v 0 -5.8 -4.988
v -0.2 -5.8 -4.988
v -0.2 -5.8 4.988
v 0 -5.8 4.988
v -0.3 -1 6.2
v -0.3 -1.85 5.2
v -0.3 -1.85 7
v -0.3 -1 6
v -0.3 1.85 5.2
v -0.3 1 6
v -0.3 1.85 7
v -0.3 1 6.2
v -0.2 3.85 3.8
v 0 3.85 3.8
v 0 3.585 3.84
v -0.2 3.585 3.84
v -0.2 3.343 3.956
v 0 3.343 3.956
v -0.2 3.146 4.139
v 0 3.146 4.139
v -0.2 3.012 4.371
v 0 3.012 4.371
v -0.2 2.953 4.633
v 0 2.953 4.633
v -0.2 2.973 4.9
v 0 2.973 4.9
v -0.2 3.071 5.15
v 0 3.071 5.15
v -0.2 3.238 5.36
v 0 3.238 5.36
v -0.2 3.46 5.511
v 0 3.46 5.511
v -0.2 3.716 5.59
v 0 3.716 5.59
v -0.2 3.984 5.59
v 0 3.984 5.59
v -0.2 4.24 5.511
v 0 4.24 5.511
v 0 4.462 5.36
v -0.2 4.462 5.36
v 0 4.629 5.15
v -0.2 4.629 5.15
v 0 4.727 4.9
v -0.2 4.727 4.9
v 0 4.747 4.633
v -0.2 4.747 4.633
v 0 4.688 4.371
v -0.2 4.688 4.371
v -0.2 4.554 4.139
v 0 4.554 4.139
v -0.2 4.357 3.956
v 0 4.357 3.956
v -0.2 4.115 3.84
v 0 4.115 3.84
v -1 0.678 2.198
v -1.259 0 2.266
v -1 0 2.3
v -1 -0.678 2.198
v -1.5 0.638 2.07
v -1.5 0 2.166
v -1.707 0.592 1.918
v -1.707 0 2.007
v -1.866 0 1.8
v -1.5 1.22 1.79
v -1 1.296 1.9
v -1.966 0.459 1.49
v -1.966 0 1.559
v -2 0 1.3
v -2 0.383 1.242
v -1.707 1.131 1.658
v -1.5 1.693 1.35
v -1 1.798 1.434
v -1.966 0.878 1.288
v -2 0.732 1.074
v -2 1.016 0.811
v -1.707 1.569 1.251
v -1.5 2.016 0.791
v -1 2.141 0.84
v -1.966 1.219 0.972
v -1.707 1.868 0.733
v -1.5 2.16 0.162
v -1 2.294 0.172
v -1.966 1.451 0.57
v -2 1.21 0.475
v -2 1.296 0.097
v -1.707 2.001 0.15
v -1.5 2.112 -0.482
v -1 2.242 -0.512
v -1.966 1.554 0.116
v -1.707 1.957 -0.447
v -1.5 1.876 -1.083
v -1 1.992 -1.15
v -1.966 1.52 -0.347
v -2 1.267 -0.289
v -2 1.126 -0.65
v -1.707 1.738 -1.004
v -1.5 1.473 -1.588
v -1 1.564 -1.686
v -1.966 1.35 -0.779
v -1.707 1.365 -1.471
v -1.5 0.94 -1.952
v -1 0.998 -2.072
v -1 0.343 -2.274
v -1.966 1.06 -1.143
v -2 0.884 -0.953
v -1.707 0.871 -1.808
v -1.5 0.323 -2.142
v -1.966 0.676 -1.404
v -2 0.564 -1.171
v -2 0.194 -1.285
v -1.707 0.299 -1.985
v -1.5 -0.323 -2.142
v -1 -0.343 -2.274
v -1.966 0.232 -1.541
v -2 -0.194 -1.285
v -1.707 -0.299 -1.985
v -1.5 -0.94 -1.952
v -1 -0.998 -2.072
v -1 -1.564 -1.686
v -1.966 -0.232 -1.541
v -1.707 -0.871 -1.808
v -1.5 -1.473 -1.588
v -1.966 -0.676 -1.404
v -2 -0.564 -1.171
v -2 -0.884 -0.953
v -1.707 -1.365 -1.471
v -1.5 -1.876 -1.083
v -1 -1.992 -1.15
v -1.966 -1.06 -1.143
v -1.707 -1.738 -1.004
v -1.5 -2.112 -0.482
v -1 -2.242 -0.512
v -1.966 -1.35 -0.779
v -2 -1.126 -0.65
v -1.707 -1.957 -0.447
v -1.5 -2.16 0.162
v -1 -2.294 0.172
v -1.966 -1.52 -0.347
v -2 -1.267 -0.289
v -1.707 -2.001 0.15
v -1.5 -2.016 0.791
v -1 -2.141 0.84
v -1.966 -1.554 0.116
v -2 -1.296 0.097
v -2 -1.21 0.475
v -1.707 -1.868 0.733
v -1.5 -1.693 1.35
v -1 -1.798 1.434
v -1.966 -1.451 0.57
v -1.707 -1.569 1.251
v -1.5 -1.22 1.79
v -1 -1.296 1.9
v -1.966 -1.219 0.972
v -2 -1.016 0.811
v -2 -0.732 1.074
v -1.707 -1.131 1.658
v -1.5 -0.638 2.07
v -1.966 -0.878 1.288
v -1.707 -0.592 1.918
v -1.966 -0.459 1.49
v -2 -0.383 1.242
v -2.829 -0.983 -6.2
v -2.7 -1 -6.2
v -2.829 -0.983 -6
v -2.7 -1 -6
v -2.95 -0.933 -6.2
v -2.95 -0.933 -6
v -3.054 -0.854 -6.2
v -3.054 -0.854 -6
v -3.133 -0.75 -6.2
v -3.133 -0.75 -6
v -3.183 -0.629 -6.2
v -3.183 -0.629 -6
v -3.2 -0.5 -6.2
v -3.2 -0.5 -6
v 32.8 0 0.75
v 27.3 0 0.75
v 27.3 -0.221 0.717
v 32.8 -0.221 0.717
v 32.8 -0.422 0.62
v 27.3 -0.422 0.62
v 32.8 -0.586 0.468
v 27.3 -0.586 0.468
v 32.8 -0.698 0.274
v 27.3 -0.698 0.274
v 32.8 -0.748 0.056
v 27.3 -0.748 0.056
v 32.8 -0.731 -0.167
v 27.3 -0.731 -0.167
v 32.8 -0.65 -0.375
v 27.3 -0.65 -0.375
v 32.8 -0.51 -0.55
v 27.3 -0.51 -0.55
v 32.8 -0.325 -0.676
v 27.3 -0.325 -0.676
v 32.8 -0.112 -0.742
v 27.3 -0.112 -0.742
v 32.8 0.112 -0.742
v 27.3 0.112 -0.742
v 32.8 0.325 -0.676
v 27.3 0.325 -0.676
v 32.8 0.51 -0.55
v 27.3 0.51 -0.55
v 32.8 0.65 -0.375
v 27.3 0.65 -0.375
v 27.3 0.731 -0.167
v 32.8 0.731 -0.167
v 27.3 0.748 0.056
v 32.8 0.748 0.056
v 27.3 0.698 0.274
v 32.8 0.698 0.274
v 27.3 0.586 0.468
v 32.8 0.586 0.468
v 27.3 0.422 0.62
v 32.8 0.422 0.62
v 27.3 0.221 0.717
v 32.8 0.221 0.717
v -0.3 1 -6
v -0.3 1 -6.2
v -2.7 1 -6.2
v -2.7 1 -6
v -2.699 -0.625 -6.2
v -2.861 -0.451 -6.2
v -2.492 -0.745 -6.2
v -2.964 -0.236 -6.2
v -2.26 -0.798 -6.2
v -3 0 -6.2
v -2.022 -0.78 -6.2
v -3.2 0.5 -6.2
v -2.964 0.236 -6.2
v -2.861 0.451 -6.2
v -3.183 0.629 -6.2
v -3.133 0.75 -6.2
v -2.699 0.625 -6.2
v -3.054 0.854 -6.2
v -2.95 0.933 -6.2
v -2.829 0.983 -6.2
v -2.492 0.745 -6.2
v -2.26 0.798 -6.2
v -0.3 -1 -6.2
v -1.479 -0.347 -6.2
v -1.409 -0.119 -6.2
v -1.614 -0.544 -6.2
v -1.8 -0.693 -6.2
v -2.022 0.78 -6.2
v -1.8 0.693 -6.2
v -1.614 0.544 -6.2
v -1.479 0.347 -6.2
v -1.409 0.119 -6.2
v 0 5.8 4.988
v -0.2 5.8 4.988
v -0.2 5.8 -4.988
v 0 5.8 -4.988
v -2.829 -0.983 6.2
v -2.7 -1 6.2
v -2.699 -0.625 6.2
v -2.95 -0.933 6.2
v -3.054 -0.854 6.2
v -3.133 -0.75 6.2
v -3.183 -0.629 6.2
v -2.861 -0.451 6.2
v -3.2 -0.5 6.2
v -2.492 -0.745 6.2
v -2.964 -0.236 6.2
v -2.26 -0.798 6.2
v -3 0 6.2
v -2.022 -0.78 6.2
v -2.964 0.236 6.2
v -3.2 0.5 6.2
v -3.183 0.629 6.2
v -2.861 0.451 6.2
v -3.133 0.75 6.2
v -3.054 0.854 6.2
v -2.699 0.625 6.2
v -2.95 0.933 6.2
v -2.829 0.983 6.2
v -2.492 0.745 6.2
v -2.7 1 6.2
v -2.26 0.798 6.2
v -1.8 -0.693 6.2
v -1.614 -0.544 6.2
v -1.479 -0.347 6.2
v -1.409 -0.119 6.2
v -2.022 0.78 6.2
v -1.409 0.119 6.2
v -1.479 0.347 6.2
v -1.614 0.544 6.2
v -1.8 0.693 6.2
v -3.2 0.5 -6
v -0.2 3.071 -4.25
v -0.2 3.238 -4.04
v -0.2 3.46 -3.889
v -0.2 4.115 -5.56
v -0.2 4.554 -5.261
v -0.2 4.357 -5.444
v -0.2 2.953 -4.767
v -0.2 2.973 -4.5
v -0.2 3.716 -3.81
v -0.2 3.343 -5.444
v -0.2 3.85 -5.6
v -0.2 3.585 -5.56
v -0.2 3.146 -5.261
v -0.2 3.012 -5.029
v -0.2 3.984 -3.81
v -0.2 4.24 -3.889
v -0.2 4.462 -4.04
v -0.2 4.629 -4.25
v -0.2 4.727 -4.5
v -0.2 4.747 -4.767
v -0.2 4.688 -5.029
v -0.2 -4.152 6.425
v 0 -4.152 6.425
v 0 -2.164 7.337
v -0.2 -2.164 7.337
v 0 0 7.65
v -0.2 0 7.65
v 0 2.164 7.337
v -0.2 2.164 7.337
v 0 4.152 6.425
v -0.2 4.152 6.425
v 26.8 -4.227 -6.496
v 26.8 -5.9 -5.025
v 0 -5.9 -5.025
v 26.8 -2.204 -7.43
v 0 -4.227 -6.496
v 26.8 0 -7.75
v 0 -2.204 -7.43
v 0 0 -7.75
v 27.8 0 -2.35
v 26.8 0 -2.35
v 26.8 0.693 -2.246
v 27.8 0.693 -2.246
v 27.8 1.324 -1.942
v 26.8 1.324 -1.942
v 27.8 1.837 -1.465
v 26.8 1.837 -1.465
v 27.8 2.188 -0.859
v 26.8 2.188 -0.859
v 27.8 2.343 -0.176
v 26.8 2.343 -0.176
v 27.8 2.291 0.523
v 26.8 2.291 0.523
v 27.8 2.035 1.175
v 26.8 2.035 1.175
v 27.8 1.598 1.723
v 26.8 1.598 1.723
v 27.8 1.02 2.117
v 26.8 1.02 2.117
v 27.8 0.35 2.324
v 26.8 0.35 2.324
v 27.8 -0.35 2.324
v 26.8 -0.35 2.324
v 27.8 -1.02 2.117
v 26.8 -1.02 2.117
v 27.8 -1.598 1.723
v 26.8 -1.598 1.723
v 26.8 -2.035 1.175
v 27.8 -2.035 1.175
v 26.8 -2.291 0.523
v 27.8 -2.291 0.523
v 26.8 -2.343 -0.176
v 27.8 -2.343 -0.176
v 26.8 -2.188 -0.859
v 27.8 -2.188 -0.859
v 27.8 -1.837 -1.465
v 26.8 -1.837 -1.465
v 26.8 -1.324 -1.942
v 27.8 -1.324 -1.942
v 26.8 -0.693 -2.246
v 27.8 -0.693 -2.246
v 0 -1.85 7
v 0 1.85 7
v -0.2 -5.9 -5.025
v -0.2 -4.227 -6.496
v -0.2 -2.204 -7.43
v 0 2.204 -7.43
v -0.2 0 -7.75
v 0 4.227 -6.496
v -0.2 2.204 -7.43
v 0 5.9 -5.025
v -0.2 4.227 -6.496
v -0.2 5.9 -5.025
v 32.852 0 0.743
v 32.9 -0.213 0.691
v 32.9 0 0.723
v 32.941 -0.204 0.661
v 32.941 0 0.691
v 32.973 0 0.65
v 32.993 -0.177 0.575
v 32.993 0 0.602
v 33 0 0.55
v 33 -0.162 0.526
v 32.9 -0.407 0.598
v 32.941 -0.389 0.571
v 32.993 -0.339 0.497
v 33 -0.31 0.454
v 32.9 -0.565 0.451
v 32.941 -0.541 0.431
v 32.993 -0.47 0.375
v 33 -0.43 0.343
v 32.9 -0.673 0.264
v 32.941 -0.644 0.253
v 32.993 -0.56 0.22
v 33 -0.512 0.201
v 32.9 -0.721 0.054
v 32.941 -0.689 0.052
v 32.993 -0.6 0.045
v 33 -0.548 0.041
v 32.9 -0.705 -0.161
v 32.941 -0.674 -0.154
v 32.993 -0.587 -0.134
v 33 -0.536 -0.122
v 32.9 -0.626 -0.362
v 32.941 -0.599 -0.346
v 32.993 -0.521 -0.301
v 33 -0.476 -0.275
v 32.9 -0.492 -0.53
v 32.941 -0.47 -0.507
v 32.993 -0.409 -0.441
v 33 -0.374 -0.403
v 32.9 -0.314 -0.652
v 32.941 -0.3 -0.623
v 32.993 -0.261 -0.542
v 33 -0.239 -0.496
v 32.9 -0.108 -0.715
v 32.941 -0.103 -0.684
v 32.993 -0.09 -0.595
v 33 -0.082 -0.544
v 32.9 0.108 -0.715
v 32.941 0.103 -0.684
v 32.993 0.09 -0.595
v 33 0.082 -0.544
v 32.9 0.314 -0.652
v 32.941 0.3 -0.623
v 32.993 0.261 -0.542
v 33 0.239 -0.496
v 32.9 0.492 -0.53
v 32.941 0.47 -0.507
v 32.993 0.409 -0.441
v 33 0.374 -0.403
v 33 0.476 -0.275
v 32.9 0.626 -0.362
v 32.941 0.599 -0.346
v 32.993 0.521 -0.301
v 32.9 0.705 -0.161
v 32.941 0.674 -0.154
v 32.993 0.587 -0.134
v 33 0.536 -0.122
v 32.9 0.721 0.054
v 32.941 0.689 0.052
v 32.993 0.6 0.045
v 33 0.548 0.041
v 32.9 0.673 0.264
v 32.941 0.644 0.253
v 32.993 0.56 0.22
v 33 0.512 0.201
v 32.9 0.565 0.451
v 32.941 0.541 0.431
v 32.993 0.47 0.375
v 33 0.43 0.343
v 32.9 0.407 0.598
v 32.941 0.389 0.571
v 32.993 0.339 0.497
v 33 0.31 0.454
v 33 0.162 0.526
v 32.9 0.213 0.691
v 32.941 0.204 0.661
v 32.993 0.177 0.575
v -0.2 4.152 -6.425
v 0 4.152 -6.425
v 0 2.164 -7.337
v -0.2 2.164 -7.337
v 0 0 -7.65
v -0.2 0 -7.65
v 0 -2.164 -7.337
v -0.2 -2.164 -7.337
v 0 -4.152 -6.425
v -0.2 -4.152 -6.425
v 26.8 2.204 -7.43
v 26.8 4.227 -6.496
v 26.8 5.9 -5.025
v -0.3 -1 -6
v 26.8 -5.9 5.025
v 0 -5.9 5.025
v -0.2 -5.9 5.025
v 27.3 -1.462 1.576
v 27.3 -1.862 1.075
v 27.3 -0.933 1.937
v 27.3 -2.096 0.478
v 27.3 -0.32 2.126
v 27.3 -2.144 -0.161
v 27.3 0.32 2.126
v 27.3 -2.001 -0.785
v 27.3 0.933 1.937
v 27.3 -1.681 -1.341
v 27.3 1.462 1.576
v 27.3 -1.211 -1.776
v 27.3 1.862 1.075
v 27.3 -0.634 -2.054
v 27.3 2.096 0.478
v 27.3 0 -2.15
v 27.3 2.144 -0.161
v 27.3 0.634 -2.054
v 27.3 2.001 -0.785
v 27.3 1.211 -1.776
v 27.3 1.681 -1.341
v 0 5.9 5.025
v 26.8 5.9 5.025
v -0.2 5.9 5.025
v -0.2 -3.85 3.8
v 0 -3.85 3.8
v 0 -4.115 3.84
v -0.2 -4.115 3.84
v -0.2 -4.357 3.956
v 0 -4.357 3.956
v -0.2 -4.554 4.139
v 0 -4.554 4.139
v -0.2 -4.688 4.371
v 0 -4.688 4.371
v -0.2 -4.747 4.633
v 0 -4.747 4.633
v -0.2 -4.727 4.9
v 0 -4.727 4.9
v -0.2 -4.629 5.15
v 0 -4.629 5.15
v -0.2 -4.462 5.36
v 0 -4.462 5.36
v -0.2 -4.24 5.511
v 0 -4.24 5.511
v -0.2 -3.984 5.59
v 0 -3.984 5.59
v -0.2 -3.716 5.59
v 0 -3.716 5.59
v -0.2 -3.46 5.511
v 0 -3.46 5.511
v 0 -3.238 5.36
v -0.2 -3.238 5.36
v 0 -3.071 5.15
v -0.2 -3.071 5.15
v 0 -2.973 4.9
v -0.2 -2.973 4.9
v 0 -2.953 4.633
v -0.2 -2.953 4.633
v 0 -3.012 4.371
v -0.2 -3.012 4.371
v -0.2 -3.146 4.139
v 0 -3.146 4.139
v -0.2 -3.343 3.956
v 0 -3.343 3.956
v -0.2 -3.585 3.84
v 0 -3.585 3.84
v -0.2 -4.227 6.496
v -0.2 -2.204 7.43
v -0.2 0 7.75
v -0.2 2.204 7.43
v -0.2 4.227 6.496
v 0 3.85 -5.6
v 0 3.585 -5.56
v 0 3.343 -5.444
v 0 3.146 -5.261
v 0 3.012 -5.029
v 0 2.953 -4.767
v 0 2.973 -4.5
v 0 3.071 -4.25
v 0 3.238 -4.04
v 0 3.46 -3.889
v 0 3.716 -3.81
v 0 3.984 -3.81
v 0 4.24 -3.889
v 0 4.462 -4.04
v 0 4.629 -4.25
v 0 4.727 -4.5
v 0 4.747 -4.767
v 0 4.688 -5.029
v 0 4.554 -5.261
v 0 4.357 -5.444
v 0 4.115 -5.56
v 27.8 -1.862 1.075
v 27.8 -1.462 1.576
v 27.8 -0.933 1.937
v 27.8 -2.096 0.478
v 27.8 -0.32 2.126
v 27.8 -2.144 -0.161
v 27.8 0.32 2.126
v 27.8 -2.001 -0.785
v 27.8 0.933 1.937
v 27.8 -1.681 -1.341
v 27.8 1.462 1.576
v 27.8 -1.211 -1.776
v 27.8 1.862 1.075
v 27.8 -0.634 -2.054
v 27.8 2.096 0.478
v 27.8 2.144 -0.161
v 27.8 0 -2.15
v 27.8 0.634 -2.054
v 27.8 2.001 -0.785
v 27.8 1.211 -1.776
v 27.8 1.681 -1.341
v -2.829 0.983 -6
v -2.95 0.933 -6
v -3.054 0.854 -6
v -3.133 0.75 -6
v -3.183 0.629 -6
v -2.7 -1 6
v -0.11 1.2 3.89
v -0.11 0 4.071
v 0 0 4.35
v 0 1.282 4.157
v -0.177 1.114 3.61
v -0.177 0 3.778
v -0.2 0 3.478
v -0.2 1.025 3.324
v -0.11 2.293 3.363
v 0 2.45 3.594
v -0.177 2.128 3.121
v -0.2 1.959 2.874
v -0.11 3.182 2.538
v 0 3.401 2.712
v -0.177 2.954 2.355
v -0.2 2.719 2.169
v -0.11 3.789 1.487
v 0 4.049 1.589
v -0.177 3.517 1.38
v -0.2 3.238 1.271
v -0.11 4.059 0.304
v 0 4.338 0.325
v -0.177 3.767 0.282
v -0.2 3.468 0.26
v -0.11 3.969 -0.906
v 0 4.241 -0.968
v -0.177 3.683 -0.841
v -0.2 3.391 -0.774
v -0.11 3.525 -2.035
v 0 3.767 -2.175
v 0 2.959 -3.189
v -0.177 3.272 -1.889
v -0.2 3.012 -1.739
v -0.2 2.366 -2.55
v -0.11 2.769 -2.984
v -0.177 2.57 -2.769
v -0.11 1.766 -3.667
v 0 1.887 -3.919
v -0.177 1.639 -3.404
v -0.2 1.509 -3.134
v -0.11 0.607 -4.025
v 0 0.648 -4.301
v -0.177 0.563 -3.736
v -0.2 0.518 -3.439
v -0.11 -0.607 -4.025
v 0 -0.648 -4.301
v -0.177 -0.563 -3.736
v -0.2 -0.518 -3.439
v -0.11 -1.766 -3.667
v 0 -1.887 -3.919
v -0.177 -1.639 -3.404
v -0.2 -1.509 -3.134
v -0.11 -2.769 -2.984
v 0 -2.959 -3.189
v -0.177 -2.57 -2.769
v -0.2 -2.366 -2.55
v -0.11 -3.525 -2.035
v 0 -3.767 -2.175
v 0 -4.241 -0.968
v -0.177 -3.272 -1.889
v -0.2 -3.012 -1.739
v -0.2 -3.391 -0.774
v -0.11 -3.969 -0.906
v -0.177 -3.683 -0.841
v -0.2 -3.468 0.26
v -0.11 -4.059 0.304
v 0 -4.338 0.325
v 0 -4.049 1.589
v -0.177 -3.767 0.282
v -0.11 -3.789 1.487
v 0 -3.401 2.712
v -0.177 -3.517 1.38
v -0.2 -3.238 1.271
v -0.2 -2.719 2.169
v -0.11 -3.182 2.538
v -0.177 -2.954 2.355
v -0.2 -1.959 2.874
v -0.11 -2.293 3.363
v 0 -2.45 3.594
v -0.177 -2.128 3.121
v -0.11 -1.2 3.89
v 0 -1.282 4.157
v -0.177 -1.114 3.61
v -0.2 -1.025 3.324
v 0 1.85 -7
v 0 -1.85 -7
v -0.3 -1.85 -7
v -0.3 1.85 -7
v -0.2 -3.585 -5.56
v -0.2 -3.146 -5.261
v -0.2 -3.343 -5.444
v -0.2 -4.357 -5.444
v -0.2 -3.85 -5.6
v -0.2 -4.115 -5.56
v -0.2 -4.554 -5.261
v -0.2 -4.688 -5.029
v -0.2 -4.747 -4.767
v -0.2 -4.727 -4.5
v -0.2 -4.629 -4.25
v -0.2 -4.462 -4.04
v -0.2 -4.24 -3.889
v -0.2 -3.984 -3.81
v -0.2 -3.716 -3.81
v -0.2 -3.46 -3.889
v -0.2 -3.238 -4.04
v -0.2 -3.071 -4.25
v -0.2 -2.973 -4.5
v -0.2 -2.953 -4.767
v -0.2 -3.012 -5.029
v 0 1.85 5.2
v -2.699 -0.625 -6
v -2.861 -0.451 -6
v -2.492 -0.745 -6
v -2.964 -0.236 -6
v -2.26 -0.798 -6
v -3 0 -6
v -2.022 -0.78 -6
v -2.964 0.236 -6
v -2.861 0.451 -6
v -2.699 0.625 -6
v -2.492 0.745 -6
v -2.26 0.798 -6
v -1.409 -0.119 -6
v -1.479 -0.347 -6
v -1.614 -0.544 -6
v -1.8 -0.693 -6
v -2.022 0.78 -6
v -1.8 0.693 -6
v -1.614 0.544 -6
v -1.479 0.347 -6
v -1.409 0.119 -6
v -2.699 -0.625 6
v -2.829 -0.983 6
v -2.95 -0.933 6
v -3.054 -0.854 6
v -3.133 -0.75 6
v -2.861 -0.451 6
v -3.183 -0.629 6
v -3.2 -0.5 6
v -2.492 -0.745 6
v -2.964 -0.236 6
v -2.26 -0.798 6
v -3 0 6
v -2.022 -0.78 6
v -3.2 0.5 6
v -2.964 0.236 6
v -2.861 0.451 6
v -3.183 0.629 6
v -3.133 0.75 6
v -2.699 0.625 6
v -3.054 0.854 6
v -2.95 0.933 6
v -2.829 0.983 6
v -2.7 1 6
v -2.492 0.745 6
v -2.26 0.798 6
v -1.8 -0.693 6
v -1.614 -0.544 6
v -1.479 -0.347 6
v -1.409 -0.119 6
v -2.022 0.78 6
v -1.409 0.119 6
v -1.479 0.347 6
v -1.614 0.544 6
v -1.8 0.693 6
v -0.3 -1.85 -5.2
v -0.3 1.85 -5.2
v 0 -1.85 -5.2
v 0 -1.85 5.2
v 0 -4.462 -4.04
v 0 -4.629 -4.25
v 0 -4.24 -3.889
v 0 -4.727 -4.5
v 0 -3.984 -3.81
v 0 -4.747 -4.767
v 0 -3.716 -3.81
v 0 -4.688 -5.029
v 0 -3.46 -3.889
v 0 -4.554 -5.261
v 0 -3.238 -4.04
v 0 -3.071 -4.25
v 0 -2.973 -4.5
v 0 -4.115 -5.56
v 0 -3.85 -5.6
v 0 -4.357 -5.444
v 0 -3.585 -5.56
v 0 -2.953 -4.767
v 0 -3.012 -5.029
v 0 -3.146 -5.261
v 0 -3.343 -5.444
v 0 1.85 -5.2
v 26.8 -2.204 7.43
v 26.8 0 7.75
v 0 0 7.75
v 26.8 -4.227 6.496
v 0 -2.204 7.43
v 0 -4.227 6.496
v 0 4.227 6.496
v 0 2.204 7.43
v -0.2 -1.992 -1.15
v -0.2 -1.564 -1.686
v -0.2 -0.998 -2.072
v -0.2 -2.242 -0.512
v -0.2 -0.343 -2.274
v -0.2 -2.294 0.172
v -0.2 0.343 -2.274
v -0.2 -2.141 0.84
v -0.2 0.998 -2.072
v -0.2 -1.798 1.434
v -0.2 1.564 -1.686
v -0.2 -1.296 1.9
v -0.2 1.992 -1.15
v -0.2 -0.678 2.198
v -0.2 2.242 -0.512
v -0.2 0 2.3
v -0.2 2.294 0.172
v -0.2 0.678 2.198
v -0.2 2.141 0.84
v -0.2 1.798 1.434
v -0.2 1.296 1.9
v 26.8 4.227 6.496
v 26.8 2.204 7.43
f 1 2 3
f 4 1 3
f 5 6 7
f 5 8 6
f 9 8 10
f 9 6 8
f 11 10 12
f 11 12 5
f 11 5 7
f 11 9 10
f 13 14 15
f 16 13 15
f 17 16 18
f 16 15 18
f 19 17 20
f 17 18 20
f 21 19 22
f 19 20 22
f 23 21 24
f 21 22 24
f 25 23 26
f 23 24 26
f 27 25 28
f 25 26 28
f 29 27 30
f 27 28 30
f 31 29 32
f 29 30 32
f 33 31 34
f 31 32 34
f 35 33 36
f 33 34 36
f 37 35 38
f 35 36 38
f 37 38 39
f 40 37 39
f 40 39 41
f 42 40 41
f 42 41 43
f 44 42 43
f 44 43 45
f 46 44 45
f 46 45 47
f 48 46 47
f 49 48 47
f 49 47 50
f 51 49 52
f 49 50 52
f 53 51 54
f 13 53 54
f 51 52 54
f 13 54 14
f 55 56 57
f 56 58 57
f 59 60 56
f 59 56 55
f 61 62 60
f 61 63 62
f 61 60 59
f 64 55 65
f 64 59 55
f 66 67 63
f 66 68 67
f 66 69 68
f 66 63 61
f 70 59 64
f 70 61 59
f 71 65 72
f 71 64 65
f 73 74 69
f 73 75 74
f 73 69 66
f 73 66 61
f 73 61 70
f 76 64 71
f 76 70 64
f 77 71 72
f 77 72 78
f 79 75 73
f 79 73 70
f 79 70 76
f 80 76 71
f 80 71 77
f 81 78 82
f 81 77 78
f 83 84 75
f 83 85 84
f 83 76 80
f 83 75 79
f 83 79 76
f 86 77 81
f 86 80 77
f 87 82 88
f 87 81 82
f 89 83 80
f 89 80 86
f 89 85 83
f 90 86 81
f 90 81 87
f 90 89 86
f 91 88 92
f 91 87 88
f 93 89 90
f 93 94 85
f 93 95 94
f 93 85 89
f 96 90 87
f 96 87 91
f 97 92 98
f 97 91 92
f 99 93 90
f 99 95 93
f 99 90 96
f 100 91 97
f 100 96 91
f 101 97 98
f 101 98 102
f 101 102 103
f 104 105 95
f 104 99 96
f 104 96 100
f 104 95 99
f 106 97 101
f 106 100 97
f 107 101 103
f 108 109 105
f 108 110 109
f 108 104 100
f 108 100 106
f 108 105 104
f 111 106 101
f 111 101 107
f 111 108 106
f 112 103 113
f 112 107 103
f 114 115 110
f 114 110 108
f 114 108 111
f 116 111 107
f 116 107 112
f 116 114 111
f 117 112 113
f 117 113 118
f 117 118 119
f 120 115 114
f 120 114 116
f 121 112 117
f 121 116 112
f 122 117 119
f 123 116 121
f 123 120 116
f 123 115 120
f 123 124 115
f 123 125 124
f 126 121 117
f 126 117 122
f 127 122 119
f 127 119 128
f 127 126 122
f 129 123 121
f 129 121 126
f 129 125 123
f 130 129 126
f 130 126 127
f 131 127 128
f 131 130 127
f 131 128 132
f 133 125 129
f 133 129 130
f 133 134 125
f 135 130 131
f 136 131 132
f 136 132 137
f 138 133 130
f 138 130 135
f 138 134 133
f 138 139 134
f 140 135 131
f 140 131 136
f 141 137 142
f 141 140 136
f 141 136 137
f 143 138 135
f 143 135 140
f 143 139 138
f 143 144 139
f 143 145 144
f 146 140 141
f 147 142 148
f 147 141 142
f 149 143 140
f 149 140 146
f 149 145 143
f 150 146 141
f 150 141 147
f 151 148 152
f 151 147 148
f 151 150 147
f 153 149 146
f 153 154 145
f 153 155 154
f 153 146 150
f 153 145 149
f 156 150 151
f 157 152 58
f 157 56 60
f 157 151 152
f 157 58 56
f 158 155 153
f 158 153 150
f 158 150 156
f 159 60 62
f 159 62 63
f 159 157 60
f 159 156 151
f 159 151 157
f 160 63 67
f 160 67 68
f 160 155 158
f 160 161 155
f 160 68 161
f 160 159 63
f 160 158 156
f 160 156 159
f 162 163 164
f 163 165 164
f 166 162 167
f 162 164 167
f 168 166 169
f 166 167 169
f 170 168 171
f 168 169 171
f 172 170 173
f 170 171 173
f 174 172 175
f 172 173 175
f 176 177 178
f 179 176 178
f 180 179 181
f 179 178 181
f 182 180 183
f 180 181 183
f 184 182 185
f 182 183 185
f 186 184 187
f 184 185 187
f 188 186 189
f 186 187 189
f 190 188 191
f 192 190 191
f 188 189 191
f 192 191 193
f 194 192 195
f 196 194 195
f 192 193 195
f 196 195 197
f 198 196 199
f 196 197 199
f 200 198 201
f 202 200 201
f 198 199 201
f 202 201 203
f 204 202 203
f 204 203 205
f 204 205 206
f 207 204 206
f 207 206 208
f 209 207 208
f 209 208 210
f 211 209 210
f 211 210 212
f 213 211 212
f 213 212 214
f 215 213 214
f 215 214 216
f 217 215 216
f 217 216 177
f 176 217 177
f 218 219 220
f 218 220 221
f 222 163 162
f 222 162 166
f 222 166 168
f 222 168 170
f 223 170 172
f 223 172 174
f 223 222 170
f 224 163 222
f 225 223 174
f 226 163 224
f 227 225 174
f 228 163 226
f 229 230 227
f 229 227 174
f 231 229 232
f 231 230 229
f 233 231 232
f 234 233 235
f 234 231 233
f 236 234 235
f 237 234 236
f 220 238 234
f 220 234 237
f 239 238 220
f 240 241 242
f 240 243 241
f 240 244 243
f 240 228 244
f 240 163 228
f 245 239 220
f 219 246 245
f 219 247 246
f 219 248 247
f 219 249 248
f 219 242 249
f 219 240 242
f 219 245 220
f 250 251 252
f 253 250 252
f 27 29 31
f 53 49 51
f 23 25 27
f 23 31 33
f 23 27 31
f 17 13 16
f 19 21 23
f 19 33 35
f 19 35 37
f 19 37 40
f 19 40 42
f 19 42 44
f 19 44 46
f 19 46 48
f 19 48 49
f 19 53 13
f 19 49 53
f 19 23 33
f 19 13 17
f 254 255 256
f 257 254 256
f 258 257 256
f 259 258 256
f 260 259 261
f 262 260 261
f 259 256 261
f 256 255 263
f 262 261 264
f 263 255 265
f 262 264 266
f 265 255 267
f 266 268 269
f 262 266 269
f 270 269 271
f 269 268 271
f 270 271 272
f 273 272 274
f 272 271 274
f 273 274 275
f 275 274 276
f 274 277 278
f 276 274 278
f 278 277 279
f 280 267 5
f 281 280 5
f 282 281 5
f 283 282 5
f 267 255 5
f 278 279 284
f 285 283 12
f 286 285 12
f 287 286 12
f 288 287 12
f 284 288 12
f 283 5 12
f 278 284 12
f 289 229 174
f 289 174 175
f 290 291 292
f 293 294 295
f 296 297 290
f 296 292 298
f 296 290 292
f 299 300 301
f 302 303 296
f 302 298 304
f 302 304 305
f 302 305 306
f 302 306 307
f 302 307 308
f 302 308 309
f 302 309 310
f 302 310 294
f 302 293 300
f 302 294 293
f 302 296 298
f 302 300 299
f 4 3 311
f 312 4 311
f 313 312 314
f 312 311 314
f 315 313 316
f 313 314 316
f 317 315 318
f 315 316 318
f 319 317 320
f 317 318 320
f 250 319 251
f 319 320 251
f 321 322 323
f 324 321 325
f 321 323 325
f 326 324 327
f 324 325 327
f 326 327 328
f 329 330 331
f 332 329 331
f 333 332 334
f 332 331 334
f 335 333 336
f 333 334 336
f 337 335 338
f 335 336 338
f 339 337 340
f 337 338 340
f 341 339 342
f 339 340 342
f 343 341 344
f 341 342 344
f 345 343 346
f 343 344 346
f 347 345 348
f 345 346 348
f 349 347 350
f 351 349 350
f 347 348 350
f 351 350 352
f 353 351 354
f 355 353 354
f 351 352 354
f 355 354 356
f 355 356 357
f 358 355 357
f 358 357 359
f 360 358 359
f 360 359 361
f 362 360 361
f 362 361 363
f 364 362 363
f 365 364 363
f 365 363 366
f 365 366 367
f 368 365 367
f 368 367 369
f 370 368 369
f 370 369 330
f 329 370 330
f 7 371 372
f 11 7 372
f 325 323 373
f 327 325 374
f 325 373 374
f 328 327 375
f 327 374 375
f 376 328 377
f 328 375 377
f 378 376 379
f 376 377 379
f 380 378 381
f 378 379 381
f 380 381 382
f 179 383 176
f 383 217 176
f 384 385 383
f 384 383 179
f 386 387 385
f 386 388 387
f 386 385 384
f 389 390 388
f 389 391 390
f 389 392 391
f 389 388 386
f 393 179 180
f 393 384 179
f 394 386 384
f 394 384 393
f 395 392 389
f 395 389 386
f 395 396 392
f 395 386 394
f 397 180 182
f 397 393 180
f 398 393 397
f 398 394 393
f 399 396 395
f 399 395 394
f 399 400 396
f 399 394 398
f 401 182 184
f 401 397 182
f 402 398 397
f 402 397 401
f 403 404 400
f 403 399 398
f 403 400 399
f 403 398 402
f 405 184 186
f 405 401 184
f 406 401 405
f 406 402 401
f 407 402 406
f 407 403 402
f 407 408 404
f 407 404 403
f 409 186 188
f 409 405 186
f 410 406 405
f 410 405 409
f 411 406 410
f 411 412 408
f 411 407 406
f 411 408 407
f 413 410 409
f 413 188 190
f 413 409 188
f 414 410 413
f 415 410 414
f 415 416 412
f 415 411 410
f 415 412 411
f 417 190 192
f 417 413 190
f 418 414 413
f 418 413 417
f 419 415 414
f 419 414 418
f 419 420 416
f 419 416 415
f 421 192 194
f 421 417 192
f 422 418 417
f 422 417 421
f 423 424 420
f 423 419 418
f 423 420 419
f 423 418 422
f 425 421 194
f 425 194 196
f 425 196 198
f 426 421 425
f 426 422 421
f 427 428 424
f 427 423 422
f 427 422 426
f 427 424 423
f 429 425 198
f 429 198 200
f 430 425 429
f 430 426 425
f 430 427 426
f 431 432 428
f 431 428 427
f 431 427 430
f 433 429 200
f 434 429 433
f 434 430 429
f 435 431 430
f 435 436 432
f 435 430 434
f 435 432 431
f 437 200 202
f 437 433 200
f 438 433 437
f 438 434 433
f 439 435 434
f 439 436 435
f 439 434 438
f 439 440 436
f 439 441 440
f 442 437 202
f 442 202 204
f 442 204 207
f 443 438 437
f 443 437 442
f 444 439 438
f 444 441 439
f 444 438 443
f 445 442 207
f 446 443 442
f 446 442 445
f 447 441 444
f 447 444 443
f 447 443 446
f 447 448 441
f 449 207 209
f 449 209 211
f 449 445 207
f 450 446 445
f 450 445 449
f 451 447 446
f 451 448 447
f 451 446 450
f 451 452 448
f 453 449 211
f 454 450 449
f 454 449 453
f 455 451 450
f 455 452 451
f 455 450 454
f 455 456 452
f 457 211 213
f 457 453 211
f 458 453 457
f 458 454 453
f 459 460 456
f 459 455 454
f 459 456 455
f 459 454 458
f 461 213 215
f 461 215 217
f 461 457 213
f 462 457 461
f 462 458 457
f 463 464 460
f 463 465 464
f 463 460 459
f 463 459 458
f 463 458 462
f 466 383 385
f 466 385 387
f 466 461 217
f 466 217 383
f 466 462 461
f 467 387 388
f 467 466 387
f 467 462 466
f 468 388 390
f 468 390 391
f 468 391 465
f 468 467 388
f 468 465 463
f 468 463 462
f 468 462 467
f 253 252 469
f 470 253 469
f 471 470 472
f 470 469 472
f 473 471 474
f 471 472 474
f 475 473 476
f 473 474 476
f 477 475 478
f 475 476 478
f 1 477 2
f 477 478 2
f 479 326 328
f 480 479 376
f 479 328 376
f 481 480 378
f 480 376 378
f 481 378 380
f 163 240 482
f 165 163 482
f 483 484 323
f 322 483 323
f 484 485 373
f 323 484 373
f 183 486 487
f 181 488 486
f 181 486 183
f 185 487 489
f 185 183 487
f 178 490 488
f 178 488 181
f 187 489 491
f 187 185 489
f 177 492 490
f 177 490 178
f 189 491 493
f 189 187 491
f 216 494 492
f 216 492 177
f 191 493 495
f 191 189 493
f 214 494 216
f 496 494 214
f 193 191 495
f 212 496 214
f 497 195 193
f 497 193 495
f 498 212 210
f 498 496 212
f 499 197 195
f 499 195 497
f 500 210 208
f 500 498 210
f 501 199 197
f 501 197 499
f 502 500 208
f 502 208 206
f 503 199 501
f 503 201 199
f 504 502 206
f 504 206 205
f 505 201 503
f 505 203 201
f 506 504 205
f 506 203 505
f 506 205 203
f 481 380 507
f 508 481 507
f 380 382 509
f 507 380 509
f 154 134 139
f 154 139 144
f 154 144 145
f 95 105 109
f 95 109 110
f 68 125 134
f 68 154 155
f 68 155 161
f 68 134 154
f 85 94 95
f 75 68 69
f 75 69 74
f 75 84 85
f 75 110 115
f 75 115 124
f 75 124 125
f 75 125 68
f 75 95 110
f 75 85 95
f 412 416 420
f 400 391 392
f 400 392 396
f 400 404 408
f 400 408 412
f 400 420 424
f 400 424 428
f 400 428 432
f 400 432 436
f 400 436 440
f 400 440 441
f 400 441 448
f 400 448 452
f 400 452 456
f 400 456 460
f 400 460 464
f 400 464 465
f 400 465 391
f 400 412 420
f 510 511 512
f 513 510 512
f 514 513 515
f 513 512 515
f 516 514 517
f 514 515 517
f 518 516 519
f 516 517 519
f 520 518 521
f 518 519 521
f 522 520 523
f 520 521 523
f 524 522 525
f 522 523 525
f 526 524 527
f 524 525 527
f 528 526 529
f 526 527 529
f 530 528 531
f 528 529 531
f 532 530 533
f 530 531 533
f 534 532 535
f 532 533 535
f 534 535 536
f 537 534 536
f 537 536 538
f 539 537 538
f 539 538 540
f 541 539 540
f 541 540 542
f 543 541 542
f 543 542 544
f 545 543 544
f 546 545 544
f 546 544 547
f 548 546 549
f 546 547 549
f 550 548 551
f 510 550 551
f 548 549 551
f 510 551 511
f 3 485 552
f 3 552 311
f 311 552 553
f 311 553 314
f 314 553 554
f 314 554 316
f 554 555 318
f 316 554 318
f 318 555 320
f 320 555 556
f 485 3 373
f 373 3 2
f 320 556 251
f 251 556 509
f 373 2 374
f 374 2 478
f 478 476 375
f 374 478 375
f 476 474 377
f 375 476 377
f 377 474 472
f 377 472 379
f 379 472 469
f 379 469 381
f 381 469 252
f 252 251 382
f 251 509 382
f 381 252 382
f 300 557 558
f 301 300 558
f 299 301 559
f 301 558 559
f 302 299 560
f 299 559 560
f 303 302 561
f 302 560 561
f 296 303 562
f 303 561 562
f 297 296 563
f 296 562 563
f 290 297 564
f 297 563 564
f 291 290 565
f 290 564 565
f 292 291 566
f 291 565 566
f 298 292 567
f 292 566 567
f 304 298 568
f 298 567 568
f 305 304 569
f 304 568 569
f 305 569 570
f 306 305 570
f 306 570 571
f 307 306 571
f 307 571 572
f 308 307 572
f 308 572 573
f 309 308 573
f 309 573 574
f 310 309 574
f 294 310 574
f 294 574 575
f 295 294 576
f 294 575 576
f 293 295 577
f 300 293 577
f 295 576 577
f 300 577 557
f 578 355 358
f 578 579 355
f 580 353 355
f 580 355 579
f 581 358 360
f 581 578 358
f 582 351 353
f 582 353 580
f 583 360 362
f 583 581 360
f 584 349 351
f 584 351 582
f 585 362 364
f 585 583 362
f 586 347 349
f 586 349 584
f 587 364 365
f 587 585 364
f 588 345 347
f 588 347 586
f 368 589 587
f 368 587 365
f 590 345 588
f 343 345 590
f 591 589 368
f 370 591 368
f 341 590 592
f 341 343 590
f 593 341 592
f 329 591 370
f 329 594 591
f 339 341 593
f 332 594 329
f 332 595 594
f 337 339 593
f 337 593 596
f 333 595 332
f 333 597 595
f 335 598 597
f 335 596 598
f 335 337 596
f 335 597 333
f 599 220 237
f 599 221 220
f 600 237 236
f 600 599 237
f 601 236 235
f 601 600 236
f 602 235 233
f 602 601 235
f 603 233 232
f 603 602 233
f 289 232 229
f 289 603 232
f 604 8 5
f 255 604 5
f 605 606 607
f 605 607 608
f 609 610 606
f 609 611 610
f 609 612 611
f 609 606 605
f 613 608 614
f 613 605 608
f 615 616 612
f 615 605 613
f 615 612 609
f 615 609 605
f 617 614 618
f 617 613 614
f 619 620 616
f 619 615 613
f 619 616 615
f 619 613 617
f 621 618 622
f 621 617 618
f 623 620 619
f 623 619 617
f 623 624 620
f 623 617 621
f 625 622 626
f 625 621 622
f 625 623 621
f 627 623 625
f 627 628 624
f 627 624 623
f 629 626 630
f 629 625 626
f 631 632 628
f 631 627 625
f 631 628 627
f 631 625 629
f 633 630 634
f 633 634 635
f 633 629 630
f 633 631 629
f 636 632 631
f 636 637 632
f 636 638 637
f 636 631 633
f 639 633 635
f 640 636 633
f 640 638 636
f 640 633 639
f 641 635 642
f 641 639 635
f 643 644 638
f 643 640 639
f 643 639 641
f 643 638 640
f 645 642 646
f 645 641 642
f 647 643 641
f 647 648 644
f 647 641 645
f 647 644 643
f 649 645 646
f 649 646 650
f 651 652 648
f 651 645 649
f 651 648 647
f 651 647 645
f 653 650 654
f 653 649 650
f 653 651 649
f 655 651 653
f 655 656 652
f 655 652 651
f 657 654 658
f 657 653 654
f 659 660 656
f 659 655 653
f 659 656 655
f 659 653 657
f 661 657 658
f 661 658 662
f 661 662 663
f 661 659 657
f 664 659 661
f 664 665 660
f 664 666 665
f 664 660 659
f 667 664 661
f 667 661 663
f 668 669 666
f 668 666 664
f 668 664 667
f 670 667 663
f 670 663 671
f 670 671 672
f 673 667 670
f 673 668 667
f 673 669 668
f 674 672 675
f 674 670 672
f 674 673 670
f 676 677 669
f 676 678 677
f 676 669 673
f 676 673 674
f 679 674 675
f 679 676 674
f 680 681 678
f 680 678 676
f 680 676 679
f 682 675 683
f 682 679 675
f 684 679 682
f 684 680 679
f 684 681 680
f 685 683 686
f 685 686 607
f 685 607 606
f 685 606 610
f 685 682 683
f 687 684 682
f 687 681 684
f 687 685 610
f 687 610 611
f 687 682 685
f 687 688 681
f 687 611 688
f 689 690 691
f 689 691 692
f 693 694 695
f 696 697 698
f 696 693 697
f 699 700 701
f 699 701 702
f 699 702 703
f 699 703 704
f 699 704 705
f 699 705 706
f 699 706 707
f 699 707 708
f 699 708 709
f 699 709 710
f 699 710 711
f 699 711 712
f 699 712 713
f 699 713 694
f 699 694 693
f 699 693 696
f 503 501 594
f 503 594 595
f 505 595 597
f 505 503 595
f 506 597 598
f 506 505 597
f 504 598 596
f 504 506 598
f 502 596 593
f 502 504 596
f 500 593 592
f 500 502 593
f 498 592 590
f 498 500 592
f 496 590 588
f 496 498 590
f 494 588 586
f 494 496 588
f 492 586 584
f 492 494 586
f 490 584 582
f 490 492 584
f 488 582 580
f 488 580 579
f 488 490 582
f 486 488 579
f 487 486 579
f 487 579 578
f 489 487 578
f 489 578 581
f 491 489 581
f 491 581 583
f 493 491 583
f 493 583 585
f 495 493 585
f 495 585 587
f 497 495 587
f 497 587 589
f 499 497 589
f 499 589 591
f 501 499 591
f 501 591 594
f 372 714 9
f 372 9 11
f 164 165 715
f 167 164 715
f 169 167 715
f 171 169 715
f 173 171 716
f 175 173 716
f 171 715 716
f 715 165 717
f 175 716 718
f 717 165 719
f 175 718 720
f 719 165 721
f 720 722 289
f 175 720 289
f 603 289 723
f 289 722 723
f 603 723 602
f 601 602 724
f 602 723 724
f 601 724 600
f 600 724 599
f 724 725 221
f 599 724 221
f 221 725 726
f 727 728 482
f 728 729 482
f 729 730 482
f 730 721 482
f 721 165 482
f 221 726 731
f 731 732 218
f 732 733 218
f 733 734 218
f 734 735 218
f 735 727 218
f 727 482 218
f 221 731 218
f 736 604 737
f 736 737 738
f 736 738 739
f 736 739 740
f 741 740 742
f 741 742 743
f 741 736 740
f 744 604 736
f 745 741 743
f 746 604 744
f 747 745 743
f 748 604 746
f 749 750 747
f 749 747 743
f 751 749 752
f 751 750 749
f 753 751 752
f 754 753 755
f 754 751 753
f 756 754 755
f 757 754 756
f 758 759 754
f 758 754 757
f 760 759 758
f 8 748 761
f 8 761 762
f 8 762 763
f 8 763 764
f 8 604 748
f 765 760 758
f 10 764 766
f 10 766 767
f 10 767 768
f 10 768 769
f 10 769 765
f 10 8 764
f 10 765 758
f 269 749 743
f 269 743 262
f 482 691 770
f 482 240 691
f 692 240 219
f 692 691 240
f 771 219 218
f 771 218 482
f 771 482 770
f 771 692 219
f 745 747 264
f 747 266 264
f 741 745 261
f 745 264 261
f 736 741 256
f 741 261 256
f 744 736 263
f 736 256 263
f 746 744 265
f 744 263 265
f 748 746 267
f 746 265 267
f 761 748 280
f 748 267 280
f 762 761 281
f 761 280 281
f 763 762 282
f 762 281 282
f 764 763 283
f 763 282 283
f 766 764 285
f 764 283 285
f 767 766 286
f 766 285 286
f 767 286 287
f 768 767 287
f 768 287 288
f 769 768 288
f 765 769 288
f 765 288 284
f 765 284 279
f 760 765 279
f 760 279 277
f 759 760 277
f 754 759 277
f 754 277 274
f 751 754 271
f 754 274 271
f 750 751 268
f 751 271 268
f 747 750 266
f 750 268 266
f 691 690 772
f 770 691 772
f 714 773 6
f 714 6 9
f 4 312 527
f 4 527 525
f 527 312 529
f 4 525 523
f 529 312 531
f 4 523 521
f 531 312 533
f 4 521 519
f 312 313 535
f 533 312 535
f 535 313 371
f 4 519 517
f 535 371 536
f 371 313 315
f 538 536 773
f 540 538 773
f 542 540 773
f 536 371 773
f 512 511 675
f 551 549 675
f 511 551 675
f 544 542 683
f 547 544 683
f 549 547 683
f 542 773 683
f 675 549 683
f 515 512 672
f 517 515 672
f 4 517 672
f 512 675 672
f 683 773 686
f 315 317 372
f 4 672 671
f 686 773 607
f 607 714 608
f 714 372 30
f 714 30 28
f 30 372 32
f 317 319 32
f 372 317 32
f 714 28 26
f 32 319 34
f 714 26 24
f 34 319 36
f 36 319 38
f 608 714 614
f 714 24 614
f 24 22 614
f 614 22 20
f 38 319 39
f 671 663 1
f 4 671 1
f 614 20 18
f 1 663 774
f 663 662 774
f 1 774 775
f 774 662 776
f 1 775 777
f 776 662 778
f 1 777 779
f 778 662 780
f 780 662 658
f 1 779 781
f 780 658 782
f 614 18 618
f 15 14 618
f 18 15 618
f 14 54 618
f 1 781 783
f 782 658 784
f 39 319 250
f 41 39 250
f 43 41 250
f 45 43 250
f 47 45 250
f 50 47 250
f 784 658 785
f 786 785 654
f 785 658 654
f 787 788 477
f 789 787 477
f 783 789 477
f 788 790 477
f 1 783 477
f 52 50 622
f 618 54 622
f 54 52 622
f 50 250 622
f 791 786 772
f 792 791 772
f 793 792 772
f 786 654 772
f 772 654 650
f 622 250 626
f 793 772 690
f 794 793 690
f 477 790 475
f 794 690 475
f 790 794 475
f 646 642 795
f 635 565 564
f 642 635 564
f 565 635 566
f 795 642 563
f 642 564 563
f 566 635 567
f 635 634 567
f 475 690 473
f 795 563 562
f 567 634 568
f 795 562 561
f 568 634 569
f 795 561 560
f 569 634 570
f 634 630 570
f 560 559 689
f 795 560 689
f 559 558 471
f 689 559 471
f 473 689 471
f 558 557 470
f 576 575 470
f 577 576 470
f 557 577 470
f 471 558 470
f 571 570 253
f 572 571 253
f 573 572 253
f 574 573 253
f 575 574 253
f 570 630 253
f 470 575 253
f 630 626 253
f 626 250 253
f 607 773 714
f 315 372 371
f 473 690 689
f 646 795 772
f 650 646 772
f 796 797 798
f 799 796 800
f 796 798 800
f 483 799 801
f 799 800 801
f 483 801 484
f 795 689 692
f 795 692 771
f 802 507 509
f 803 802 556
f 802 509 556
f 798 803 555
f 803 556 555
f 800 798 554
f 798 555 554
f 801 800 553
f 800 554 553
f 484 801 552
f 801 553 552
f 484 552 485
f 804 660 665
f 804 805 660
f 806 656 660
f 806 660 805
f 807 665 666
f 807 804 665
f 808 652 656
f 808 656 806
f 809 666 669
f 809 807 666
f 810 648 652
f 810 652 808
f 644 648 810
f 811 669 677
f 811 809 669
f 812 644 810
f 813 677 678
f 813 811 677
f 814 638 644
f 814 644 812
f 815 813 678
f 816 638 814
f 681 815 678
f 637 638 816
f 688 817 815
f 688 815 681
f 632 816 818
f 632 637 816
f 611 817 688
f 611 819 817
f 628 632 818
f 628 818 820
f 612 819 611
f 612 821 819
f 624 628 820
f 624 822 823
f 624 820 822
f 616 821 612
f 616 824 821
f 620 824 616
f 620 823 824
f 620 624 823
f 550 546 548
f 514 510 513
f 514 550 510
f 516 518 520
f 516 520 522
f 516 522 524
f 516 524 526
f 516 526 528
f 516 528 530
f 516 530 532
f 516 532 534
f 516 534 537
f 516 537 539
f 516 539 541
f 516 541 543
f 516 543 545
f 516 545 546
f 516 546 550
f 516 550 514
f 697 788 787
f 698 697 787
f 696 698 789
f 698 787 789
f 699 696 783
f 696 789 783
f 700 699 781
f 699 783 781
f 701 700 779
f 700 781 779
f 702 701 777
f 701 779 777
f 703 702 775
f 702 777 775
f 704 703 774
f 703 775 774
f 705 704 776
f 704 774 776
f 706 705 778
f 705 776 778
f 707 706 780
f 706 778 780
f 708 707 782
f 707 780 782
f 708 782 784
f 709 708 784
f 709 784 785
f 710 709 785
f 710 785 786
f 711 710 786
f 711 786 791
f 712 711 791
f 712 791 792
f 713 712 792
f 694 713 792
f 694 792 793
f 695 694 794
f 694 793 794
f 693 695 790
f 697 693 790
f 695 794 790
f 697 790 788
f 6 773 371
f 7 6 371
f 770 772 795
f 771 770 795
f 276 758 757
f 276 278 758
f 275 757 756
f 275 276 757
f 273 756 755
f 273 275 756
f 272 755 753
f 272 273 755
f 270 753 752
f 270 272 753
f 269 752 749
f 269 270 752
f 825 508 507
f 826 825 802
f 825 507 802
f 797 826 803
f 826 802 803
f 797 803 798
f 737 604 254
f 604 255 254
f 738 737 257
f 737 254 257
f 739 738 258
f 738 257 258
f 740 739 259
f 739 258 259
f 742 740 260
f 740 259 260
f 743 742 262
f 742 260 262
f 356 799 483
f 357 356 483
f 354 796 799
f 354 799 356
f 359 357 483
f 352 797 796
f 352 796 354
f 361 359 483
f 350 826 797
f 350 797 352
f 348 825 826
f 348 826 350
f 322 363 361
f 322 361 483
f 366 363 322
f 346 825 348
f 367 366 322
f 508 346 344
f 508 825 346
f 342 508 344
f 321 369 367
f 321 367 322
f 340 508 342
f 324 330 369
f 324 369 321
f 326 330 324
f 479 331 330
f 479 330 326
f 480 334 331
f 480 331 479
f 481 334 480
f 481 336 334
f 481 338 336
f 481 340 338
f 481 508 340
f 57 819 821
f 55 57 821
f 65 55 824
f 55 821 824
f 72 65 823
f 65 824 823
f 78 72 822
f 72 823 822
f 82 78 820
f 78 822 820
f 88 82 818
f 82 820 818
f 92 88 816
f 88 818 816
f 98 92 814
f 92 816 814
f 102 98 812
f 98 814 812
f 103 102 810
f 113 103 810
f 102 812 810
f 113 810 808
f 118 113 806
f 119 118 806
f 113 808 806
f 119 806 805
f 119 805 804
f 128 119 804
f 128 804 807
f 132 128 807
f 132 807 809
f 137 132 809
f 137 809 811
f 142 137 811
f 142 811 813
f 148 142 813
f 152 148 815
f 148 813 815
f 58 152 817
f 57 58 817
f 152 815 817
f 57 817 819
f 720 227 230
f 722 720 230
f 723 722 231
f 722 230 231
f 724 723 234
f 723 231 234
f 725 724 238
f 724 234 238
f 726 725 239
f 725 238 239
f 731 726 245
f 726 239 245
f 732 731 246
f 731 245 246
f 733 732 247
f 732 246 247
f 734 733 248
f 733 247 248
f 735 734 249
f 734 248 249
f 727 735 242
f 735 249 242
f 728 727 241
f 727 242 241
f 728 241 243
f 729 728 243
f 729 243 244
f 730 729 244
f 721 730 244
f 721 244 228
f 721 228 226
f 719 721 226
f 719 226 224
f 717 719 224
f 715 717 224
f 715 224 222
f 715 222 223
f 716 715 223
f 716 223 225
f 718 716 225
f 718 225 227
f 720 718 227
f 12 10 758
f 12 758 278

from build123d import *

# Parameters (mm, degrees)
EXTRUDE_1_DEPTH     = 26.8
EXTRUDE_START       = -0.2
EXTRUDE_1_2_DEPTH   = 0.2
SKETCH_2_R          = 4.35
EXTRUDE_2_DEPTH     = 0.2
FILLET_1_R          = 2
SKETCH_3_R          = 2.3
EXTRUDE_3_DEPTH     = 1.8
FILLET_2_R          = 1
SKETCH_4_W          = 1.8
SKETCH_4_H          = 3.7
EXTRUDE_8_DEPTH     = 0.3
SKETCH_4_4_W        = 0.2
SKETCH_4_4_H        = 2
EXTRUDE_9_DEPTH     = 3.2
CUT_EXTRUDE_1_REACH = 32.784
SKETCH_5_R          = 0.8
CUT_EXTRUDE_2_REACH = 32.784
SKETCH_6_R          = 0.8
FILLET_3_R          = 0.5
SKETCH_7_R          = 0.9
EXTRUDE_10_DEPTH    = 0.2
SKETCH_8_R          = 2.35
SKETCH_8_R_2        = 2.15
EXTRUDE_2_2_DEPTH   = 1
SKETCH_8_2_R        = 2.35
EXTRUDE_11_DEPTH    = 0.5
SKETCH_9_R          = 0.75
EXTRUDE_12_DEPTH    = 6.2
FILLET_4_R          = 0.2


# Read off the part's stored shape, not the designer's step: 拉伸-薄壁1
with BuildPart() as part:
    # 草图1 → Extrude 1 (new body)
    with BuildSketch(Plane(origin=(0, 0, 0), x_dir=(0, 0, -1), z_dir=(1, 0, 0))):
        with BuildLine():
            ThreePointArc((-7.75, 0), (-7.035897095, -3.249407956), (-5.025186564, -5.9))
            Line((-5.025186564, -5.9), (5.025186564, -5.9))
            ThreePointArc((5.025186564, -5.9), (7.035897095, -3.249407956), (7.75, 0))
            ThreePointArc((7.75, 0), (7.035897095, 3.249407956), (5.025186564, 5.9))
            Line((5.025186564, 5.9), (-5.025186564, 5.9))
            ThreePointArc((-5.025186564, 5.9), (-7.035897095, 3.249407956), (-7.75, 0))
        make_face()
    extrude(amount=EXTRUDE_1_DEPTH)



with BuildPart() as body_2:
    # Extrude 1 2 outline → Extrude 1 2 (new body)
    with BuildSketch(Plane(origin=(0, 0, 0), x_dir=(0, 0, -1), z_dir=(1, 0, 0)).offset(EXTRUDE_START)):
        with BuildLine():
            Line((5.025186564, 5.9), (-5.025186564, 5.9))
            ThreePointArc((-5.025186564, 5.9), (-7.75, 0), (-5.025186564, -5.9))
            Line((-5.025186564, -5.9), (5.025186564, -5.9))
            ThreePointArc((5.025186564, -5.9), (7.75, 0), (5.025186564, 5.9))
        make_face()
        with BuildLine():
            ThreePointArc((-4.988236161, -5.8), (-7.65, 0), (-4.988236161, 5.8))
            Line((-4.988236161, 5.8), (4.988236161, 5.8))
            ThreePointArc((4.988236161, 5.8), (7.65, 0), (4.988236161, -5.8))
            Line((4.988236161, -5.8), (-4.988236161, -5.8))
        make_face(mode=Mode.SUBTRACT)
    extrude(amount=EXTRUDE_1_2_DEPTH)


with BuildPart() as part_1:
    add(part.part)

    add(body_2.part)  # Extrude 2 merges body 2
    # 草图2 → Extrude 2 (add)
    with BuildSketch(Plane.ZY):
        Circle(SKETCH_2_R)
    extrude(amount=EXTRUDE_2_DEPTH)

    # 圆角1
    # the kernel refuses this fillet: 2 mm, written as the material it takes off along each edge
    with BuildSketch(Plane(origin=(-0.2, 0, 0), x_dir=(0, 0, 1), z_dir=(0, -1, 0))) as fillet_1_piece_1:
        with BuildLine():
            CenterArc((3.478220211, -2), FILLET_1_R, 64.158067237, 25.841932763)
            Line((3.478220211, 0), (3.478220211, 0.04))
            Line((3.478220211, 0.04), (4.35, 0.04))
            Line((4.35, 0.04), (4.39, 0))
            ThreePointArc((4.39, 0), (4.39, -0.1), (4.367435596, -0.164))
            Line((4.367435596, -0.164), (4.35, -0.2))
        make_face()
    revolve(axis=Axis((-0.2, 0, 0), (-1, 0, 0)), mode=Mode.SUBTRACT)

    # 草图3 → 凸台-拉伸3 (add)
    with BuildSketch(Plane.ZY.offset(0.2)):
        Circle(SKETCH_3_R)
    extrude(amount=EXTRUDE_3_DEPTH)

    # 圆角2
    fillet_2_edges = [part_1.edges().sort_by_distance(p)[0] for p in [
        (-2, 0, -2.3),
    ]]
    fillet(fillet_2_edges, radius=FILLET_2_R)

    # 草图4 → 凸台-拉伸8 (add)
    with BuildSketch(Plane.ZY):
        with Locations((-6.1, 0)):
            Rectangle(SKETCH_4_W, SKETCH_4_H)
        with Locations((6.1, 0)):
            Rectangle(SKETCH_4_W, SKETCH_4_H)
    extrude(amount=EXTRUDE_8_DEPTH)

    # 草图4<4> → 凸台-拉伸9 (add)
    with BuildSketch(Plane.ZY):
        with Locations((6.1, 0)):
            Rectangle(SKETCH_4_4_W, SKETCH_4_4_H)
        with Locations((-6.1, 0)):
            Rectangle(SKETCH_4_4_W, SKETCH_4_4_H)
    extrude(amount=EXTRUDE_9_DEPTH)

    # 草图5 → 切除-拉伸1 (cut, up to next)
    with BuildSketch(Plane(origin=(0, 0, -6.2), x_dir=(-1, 0, 0), z_dir=(0, 0, -1)), mode=Mode.PRIVATE) as cut_extrude_1_sk1:
        with Locations((2.2, 0)):
            Circle(SKETCH_5_R)
    cut_extrude_1_tool1 = extrude(cut_extrude_1_sk1.sketch, amount=-CUT_EXTRUDE_1_REACH, mode=Mode.PRIVATE) & part_1.part
    add(cut_extrude_1_tool1.solids().sort_by_distance((-2.2, 0, -6.2))[0], mode=Mode.SUBTRACT)

    # 草图6 → 切除-拉伸2 (cut, up to next)
    with BuildSketch(Plane.XY.offset(6.2), mode=Mode.PRIVATE) as cut_extrude_2_sk1:
        with Locations(Location((-2.2, 0, 0), (0, 0, 180))):
            Circle(SKETCH_6_R)
    cut_extrude_2_tool1 = extrude(cut_extrude_2_sk1.sketch, amount=-CUT_EXTRUDE_2_REACH, mode=Mode.PRIVATE) & part_1.part
    add(cut_extrude_2_tool1.solids().sort_by_distance((-2.2, 0, 6.2))[0], mode=Mode.SUBTRACT)

    # 圆角3
    fillet_3_edges = [part_1.edges().sort_by_distance(p)[0] for p in [
        (-3.2, -1, -6.1),
        (-3.2, 1, -6.1),
        (-3.2, 1, 6.1),
        (-3.2, -1, 6.1),
    ]]
    fillet(fillet_3_edges, radius=FILLET_3_R)

    # 草图7 → 凸台-拉伸10 (add)
    with BuildSketch(Plane.ZY):
        with Locations(Location((-4.7, 3.85, 0), (0, 0, 180))):
            Circle(SKETCH_7_R)
        with Locations(Location((4.7, 3.85, 0), (0, 0, 180))):
            Circle(SKETCH_7_R)
        with Locations(Location((4.7, -3.85, 0), (0, 0, 180))):
            Circle(SKETCH_7_R)
        with Locations(Location((-4.7, -3.85, 0), (0, 0, 180))):
            Circle(SKETCH_7_R)
    extrude(amount=EXTRUDE_10_DEPTH)

    # 草图8 → Extrude 2 2 (add)
    with BuildSketch(Plane(origin=(26.8, 0, 0), x_dir=(0, 0, -1), z_dir=(1, 0, 0))):
        Circle(SKETCH_8_R)
        Circle(SKETCH_8_R_2, mode=Mode.SUBTRACT)
    extrude(amount=EXTRUDE_2_2_DEPTH)

    # 草图8<2> → 凸台-拉伸11 (add)
    with BuildSketch(Plane(origin=(26.8, 0, 0), x_dir=(0, 0, -1), z_dir=(1, 0, 0))):
        Circle(SKETCH_8_2_R)
    extrude(amount=EXTRUDE_11_DEPTH)

    # 草图9 → 凸台-拉伸12 (add)
    with BuildSketch(Plane(origin=(26.8, 0, 0), x_dir=(0, 0, -1), z_dir=(1, 0, 0))):
        with Locations(Location((0, 0, 0), (0, 0, 180))):
            Circle(SKETCH_9_R)
    extrude(amount=EXTRUDE_12_DEPTH)

    # 圆角4
    fillet_4_edges = [part_1.edges().sort_by_distance(p)[0] for p in [
        (33, 0, -0.75),
    ]]
    fillet(fillet_4_edges, radius=FILLET_4_R)


solid = part_1.part
